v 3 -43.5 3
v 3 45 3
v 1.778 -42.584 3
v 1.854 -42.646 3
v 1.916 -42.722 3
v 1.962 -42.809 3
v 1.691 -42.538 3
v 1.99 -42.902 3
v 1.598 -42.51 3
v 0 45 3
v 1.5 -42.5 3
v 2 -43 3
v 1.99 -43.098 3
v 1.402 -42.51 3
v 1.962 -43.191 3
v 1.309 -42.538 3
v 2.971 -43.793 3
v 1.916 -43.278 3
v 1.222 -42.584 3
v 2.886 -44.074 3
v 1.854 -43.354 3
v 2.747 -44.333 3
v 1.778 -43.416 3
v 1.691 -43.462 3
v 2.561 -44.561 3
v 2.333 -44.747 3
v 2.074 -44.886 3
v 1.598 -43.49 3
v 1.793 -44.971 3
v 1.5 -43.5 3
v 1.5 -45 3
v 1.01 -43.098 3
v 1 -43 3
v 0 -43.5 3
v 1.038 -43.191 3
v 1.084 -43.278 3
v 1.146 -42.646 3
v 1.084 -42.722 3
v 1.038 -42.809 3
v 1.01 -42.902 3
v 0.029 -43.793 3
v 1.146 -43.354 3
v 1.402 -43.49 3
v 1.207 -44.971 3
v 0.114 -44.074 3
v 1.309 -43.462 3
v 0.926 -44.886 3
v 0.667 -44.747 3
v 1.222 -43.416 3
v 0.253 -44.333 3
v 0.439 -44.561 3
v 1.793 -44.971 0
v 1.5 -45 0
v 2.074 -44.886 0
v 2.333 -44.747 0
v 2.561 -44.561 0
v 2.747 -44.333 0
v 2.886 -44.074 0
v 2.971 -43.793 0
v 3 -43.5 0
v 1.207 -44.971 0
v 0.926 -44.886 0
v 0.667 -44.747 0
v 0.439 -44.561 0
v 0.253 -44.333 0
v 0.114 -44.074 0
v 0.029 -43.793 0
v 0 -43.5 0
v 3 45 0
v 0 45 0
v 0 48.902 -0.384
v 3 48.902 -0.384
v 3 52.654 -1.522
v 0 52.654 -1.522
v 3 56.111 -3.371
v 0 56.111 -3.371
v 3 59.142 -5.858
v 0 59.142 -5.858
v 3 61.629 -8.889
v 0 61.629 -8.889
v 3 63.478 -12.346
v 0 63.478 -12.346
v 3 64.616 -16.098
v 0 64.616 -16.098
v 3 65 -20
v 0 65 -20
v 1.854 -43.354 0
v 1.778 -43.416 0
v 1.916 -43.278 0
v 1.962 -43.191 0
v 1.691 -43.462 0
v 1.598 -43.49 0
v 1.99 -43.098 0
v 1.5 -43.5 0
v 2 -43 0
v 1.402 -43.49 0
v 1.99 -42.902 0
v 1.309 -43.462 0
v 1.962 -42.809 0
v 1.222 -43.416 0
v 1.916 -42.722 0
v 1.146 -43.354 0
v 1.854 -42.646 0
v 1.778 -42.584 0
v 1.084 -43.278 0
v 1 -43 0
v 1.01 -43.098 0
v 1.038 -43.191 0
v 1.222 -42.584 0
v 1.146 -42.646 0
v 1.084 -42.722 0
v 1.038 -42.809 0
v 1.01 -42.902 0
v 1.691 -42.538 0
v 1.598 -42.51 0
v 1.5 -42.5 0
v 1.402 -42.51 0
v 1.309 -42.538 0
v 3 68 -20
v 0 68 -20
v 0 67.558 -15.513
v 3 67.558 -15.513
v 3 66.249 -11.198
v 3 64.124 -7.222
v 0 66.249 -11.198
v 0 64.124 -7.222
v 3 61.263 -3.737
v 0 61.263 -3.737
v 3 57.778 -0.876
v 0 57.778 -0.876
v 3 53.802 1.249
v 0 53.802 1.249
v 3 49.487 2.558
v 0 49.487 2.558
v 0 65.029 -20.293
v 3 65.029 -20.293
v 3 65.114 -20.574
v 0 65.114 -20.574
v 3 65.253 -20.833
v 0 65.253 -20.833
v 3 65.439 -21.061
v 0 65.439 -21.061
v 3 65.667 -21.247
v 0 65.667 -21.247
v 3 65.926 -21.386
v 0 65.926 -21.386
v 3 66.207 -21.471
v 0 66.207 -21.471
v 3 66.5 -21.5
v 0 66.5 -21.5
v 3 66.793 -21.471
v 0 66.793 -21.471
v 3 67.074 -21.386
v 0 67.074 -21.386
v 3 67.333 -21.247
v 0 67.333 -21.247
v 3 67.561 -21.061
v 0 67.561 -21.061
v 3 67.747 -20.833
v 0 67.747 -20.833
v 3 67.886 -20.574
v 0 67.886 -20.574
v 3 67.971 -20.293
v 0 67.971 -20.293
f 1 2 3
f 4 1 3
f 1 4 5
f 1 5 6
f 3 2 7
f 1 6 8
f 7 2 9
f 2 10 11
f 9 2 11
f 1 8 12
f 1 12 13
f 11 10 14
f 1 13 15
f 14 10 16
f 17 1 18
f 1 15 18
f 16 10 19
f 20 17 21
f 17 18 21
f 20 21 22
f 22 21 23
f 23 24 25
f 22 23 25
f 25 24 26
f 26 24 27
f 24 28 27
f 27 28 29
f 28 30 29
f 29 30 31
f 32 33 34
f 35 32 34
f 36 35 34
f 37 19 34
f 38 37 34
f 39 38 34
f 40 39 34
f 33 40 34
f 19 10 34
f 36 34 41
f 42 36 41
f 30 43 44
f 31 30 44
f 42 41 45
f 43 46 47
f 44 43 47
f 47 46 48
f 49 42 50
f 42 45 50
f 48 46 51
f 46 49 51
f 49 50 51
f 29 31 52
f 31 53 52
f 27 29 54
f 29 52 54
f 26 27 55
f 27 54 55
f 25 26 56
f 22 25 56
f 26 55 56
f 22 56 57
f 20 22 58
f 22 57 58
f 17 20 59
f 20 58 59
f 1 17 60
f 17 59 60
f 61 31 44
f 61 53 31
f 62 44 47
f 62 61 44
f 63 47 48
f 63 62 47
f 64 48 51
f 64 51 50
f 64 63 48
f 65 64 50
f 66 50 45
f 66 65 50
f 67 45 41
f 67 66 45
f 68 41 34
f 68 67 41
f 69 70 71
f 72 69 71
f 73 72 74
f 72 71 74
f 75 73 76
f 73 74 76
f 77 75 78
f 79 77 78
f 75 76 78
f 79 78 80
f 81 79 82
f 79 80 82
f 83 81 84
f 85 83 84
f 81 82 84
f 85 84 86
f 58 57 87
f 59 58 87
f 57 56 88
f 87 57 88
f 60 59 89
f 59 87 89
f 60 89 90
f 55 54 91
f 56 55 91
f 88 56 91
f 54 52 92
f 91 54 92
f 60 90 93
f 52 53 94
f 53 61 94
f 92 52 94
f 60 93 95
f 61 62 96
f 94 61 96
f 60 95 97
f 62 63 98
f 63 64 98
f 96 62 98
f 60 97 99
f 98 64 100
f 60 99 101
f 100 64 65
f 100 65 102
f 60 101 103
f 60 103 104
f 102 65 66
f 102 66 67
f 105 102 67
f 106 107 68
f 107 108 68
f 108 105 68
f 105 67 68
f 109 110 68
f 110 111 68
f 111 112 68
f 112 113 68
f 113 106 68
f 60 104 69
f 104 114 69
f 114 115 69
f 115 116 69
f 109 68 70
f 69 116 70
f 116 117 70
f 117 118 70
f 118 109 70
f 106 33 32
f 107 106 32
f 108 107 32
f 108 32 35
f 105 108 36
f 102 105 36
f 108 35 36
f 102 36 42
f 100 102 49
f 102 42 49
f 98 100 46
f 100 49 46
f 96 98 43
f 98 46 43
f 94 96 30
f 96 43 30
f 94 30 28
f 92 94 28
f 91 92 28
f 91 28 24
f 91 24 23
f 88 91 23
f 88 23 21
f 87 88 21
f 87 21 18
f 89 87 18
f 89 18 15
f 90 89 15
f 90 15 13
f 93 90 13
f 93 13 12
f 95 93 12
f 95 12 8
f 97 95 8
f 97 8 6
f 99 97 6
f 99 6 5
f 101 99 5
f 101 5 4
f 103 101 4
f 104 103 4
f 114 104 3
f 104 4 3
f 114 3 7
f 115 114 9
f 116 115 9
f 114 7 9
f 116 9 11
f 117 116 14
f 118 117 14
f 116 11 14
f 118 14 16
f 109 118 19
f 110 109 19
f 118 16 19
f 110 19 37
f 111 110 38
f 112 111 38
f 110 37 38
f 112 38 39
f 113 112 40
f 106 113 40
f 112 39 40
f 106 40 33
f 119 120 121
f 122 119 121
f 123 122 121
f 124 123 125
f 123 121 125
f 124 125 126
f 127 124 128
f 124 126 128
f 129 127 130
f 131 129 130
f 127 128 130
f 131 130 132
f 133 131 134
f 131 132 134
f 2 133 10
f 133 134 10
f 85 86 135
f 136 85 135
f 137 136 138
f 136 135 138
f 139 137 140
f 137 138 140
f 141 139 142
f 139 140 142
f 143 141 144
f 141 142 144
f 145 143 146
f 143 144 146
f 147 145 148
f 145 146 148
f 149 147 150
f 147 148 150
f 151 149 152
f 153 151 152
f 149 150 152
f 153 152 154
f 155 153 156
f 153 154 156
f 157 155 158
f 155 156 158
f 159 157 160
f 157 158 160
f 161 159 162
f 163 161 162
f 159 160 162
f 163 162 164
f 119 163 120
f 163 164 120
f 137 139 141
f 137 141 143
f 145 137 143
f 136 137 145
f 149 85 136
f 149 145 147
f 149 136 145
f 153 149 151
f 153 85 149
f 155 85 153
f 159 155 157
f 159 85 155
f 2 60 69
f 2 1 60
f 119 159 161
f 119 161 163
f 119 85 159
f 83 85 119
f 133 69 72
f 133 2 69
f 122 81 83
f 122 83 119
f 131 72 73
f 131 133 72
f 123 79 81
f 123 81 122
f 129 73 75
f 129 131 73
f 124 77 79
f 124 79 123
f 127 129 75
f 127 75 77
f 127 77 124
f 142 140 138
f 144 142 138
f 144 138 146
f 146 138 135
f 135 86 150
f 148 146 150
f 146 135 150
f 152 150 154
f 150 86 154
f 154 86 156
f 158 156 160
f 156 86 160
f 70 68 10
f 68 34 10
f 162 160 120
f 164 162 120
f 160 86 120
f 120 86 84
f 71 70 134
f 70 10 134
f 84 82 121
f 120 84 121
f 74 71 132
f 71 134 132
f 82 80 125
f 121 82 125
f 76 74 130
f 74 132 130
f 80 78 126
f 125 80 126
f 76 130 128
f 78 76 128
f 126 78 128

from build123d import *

# Parameters (mm, degrees)
F1_DEPTH = 3
F3_D     = 1
F4_R     = 1.49999


# Not quite as in the source:
# - a fillet or chamfer is up to 0.001 mm smaller than in the source, because OpenCascade refuses the exact size
# - ends of sketch curves that miss each other by under 0.0002 mm in the source are joined


with BuildPart() as f1:
    # F0 (on Right) → F1 (new body)
    with BuildSketch(Plane.YZ):
        with BuildLine():
            Line((-45, 3), (-45, 0))
            Line((-45, 0), (45, 0))
            ThreePointArc((45, 0), (59.1421356237, -5.8578643763), (65, -20))
            ThreePointArc((65, -20), (66.5000000156, -21.499999553), (68, -19.999999553))
            ThreePointArc((68, -19.999999553), (61.2634559673, -3.7365440327), (45, 3))
            Line((45, 3), (-45, 3))
        make_face()
    extrude(amount=F1_DEPTH)

    # F3 (through all)
    with Locations(Plane(origin=(0, 0, 0), x_dir=(1, 0, 0), z_dir=(0, 0, -1))):
        with Locations((1.5, 43)):
            Hole(F3_D / 2)

    # F4 (radius 1.5 in the source; OpenCascade refuses exactly that, so slightly less here)
    f4_edges = [f1.edges().sort_by_distance(p)[0] for p in [
        (3, -45, 1.5),
        (0, -45, 1.5),
    ]]
    fillet(f4_edges, radius=F4_R)


solid = f1.part
